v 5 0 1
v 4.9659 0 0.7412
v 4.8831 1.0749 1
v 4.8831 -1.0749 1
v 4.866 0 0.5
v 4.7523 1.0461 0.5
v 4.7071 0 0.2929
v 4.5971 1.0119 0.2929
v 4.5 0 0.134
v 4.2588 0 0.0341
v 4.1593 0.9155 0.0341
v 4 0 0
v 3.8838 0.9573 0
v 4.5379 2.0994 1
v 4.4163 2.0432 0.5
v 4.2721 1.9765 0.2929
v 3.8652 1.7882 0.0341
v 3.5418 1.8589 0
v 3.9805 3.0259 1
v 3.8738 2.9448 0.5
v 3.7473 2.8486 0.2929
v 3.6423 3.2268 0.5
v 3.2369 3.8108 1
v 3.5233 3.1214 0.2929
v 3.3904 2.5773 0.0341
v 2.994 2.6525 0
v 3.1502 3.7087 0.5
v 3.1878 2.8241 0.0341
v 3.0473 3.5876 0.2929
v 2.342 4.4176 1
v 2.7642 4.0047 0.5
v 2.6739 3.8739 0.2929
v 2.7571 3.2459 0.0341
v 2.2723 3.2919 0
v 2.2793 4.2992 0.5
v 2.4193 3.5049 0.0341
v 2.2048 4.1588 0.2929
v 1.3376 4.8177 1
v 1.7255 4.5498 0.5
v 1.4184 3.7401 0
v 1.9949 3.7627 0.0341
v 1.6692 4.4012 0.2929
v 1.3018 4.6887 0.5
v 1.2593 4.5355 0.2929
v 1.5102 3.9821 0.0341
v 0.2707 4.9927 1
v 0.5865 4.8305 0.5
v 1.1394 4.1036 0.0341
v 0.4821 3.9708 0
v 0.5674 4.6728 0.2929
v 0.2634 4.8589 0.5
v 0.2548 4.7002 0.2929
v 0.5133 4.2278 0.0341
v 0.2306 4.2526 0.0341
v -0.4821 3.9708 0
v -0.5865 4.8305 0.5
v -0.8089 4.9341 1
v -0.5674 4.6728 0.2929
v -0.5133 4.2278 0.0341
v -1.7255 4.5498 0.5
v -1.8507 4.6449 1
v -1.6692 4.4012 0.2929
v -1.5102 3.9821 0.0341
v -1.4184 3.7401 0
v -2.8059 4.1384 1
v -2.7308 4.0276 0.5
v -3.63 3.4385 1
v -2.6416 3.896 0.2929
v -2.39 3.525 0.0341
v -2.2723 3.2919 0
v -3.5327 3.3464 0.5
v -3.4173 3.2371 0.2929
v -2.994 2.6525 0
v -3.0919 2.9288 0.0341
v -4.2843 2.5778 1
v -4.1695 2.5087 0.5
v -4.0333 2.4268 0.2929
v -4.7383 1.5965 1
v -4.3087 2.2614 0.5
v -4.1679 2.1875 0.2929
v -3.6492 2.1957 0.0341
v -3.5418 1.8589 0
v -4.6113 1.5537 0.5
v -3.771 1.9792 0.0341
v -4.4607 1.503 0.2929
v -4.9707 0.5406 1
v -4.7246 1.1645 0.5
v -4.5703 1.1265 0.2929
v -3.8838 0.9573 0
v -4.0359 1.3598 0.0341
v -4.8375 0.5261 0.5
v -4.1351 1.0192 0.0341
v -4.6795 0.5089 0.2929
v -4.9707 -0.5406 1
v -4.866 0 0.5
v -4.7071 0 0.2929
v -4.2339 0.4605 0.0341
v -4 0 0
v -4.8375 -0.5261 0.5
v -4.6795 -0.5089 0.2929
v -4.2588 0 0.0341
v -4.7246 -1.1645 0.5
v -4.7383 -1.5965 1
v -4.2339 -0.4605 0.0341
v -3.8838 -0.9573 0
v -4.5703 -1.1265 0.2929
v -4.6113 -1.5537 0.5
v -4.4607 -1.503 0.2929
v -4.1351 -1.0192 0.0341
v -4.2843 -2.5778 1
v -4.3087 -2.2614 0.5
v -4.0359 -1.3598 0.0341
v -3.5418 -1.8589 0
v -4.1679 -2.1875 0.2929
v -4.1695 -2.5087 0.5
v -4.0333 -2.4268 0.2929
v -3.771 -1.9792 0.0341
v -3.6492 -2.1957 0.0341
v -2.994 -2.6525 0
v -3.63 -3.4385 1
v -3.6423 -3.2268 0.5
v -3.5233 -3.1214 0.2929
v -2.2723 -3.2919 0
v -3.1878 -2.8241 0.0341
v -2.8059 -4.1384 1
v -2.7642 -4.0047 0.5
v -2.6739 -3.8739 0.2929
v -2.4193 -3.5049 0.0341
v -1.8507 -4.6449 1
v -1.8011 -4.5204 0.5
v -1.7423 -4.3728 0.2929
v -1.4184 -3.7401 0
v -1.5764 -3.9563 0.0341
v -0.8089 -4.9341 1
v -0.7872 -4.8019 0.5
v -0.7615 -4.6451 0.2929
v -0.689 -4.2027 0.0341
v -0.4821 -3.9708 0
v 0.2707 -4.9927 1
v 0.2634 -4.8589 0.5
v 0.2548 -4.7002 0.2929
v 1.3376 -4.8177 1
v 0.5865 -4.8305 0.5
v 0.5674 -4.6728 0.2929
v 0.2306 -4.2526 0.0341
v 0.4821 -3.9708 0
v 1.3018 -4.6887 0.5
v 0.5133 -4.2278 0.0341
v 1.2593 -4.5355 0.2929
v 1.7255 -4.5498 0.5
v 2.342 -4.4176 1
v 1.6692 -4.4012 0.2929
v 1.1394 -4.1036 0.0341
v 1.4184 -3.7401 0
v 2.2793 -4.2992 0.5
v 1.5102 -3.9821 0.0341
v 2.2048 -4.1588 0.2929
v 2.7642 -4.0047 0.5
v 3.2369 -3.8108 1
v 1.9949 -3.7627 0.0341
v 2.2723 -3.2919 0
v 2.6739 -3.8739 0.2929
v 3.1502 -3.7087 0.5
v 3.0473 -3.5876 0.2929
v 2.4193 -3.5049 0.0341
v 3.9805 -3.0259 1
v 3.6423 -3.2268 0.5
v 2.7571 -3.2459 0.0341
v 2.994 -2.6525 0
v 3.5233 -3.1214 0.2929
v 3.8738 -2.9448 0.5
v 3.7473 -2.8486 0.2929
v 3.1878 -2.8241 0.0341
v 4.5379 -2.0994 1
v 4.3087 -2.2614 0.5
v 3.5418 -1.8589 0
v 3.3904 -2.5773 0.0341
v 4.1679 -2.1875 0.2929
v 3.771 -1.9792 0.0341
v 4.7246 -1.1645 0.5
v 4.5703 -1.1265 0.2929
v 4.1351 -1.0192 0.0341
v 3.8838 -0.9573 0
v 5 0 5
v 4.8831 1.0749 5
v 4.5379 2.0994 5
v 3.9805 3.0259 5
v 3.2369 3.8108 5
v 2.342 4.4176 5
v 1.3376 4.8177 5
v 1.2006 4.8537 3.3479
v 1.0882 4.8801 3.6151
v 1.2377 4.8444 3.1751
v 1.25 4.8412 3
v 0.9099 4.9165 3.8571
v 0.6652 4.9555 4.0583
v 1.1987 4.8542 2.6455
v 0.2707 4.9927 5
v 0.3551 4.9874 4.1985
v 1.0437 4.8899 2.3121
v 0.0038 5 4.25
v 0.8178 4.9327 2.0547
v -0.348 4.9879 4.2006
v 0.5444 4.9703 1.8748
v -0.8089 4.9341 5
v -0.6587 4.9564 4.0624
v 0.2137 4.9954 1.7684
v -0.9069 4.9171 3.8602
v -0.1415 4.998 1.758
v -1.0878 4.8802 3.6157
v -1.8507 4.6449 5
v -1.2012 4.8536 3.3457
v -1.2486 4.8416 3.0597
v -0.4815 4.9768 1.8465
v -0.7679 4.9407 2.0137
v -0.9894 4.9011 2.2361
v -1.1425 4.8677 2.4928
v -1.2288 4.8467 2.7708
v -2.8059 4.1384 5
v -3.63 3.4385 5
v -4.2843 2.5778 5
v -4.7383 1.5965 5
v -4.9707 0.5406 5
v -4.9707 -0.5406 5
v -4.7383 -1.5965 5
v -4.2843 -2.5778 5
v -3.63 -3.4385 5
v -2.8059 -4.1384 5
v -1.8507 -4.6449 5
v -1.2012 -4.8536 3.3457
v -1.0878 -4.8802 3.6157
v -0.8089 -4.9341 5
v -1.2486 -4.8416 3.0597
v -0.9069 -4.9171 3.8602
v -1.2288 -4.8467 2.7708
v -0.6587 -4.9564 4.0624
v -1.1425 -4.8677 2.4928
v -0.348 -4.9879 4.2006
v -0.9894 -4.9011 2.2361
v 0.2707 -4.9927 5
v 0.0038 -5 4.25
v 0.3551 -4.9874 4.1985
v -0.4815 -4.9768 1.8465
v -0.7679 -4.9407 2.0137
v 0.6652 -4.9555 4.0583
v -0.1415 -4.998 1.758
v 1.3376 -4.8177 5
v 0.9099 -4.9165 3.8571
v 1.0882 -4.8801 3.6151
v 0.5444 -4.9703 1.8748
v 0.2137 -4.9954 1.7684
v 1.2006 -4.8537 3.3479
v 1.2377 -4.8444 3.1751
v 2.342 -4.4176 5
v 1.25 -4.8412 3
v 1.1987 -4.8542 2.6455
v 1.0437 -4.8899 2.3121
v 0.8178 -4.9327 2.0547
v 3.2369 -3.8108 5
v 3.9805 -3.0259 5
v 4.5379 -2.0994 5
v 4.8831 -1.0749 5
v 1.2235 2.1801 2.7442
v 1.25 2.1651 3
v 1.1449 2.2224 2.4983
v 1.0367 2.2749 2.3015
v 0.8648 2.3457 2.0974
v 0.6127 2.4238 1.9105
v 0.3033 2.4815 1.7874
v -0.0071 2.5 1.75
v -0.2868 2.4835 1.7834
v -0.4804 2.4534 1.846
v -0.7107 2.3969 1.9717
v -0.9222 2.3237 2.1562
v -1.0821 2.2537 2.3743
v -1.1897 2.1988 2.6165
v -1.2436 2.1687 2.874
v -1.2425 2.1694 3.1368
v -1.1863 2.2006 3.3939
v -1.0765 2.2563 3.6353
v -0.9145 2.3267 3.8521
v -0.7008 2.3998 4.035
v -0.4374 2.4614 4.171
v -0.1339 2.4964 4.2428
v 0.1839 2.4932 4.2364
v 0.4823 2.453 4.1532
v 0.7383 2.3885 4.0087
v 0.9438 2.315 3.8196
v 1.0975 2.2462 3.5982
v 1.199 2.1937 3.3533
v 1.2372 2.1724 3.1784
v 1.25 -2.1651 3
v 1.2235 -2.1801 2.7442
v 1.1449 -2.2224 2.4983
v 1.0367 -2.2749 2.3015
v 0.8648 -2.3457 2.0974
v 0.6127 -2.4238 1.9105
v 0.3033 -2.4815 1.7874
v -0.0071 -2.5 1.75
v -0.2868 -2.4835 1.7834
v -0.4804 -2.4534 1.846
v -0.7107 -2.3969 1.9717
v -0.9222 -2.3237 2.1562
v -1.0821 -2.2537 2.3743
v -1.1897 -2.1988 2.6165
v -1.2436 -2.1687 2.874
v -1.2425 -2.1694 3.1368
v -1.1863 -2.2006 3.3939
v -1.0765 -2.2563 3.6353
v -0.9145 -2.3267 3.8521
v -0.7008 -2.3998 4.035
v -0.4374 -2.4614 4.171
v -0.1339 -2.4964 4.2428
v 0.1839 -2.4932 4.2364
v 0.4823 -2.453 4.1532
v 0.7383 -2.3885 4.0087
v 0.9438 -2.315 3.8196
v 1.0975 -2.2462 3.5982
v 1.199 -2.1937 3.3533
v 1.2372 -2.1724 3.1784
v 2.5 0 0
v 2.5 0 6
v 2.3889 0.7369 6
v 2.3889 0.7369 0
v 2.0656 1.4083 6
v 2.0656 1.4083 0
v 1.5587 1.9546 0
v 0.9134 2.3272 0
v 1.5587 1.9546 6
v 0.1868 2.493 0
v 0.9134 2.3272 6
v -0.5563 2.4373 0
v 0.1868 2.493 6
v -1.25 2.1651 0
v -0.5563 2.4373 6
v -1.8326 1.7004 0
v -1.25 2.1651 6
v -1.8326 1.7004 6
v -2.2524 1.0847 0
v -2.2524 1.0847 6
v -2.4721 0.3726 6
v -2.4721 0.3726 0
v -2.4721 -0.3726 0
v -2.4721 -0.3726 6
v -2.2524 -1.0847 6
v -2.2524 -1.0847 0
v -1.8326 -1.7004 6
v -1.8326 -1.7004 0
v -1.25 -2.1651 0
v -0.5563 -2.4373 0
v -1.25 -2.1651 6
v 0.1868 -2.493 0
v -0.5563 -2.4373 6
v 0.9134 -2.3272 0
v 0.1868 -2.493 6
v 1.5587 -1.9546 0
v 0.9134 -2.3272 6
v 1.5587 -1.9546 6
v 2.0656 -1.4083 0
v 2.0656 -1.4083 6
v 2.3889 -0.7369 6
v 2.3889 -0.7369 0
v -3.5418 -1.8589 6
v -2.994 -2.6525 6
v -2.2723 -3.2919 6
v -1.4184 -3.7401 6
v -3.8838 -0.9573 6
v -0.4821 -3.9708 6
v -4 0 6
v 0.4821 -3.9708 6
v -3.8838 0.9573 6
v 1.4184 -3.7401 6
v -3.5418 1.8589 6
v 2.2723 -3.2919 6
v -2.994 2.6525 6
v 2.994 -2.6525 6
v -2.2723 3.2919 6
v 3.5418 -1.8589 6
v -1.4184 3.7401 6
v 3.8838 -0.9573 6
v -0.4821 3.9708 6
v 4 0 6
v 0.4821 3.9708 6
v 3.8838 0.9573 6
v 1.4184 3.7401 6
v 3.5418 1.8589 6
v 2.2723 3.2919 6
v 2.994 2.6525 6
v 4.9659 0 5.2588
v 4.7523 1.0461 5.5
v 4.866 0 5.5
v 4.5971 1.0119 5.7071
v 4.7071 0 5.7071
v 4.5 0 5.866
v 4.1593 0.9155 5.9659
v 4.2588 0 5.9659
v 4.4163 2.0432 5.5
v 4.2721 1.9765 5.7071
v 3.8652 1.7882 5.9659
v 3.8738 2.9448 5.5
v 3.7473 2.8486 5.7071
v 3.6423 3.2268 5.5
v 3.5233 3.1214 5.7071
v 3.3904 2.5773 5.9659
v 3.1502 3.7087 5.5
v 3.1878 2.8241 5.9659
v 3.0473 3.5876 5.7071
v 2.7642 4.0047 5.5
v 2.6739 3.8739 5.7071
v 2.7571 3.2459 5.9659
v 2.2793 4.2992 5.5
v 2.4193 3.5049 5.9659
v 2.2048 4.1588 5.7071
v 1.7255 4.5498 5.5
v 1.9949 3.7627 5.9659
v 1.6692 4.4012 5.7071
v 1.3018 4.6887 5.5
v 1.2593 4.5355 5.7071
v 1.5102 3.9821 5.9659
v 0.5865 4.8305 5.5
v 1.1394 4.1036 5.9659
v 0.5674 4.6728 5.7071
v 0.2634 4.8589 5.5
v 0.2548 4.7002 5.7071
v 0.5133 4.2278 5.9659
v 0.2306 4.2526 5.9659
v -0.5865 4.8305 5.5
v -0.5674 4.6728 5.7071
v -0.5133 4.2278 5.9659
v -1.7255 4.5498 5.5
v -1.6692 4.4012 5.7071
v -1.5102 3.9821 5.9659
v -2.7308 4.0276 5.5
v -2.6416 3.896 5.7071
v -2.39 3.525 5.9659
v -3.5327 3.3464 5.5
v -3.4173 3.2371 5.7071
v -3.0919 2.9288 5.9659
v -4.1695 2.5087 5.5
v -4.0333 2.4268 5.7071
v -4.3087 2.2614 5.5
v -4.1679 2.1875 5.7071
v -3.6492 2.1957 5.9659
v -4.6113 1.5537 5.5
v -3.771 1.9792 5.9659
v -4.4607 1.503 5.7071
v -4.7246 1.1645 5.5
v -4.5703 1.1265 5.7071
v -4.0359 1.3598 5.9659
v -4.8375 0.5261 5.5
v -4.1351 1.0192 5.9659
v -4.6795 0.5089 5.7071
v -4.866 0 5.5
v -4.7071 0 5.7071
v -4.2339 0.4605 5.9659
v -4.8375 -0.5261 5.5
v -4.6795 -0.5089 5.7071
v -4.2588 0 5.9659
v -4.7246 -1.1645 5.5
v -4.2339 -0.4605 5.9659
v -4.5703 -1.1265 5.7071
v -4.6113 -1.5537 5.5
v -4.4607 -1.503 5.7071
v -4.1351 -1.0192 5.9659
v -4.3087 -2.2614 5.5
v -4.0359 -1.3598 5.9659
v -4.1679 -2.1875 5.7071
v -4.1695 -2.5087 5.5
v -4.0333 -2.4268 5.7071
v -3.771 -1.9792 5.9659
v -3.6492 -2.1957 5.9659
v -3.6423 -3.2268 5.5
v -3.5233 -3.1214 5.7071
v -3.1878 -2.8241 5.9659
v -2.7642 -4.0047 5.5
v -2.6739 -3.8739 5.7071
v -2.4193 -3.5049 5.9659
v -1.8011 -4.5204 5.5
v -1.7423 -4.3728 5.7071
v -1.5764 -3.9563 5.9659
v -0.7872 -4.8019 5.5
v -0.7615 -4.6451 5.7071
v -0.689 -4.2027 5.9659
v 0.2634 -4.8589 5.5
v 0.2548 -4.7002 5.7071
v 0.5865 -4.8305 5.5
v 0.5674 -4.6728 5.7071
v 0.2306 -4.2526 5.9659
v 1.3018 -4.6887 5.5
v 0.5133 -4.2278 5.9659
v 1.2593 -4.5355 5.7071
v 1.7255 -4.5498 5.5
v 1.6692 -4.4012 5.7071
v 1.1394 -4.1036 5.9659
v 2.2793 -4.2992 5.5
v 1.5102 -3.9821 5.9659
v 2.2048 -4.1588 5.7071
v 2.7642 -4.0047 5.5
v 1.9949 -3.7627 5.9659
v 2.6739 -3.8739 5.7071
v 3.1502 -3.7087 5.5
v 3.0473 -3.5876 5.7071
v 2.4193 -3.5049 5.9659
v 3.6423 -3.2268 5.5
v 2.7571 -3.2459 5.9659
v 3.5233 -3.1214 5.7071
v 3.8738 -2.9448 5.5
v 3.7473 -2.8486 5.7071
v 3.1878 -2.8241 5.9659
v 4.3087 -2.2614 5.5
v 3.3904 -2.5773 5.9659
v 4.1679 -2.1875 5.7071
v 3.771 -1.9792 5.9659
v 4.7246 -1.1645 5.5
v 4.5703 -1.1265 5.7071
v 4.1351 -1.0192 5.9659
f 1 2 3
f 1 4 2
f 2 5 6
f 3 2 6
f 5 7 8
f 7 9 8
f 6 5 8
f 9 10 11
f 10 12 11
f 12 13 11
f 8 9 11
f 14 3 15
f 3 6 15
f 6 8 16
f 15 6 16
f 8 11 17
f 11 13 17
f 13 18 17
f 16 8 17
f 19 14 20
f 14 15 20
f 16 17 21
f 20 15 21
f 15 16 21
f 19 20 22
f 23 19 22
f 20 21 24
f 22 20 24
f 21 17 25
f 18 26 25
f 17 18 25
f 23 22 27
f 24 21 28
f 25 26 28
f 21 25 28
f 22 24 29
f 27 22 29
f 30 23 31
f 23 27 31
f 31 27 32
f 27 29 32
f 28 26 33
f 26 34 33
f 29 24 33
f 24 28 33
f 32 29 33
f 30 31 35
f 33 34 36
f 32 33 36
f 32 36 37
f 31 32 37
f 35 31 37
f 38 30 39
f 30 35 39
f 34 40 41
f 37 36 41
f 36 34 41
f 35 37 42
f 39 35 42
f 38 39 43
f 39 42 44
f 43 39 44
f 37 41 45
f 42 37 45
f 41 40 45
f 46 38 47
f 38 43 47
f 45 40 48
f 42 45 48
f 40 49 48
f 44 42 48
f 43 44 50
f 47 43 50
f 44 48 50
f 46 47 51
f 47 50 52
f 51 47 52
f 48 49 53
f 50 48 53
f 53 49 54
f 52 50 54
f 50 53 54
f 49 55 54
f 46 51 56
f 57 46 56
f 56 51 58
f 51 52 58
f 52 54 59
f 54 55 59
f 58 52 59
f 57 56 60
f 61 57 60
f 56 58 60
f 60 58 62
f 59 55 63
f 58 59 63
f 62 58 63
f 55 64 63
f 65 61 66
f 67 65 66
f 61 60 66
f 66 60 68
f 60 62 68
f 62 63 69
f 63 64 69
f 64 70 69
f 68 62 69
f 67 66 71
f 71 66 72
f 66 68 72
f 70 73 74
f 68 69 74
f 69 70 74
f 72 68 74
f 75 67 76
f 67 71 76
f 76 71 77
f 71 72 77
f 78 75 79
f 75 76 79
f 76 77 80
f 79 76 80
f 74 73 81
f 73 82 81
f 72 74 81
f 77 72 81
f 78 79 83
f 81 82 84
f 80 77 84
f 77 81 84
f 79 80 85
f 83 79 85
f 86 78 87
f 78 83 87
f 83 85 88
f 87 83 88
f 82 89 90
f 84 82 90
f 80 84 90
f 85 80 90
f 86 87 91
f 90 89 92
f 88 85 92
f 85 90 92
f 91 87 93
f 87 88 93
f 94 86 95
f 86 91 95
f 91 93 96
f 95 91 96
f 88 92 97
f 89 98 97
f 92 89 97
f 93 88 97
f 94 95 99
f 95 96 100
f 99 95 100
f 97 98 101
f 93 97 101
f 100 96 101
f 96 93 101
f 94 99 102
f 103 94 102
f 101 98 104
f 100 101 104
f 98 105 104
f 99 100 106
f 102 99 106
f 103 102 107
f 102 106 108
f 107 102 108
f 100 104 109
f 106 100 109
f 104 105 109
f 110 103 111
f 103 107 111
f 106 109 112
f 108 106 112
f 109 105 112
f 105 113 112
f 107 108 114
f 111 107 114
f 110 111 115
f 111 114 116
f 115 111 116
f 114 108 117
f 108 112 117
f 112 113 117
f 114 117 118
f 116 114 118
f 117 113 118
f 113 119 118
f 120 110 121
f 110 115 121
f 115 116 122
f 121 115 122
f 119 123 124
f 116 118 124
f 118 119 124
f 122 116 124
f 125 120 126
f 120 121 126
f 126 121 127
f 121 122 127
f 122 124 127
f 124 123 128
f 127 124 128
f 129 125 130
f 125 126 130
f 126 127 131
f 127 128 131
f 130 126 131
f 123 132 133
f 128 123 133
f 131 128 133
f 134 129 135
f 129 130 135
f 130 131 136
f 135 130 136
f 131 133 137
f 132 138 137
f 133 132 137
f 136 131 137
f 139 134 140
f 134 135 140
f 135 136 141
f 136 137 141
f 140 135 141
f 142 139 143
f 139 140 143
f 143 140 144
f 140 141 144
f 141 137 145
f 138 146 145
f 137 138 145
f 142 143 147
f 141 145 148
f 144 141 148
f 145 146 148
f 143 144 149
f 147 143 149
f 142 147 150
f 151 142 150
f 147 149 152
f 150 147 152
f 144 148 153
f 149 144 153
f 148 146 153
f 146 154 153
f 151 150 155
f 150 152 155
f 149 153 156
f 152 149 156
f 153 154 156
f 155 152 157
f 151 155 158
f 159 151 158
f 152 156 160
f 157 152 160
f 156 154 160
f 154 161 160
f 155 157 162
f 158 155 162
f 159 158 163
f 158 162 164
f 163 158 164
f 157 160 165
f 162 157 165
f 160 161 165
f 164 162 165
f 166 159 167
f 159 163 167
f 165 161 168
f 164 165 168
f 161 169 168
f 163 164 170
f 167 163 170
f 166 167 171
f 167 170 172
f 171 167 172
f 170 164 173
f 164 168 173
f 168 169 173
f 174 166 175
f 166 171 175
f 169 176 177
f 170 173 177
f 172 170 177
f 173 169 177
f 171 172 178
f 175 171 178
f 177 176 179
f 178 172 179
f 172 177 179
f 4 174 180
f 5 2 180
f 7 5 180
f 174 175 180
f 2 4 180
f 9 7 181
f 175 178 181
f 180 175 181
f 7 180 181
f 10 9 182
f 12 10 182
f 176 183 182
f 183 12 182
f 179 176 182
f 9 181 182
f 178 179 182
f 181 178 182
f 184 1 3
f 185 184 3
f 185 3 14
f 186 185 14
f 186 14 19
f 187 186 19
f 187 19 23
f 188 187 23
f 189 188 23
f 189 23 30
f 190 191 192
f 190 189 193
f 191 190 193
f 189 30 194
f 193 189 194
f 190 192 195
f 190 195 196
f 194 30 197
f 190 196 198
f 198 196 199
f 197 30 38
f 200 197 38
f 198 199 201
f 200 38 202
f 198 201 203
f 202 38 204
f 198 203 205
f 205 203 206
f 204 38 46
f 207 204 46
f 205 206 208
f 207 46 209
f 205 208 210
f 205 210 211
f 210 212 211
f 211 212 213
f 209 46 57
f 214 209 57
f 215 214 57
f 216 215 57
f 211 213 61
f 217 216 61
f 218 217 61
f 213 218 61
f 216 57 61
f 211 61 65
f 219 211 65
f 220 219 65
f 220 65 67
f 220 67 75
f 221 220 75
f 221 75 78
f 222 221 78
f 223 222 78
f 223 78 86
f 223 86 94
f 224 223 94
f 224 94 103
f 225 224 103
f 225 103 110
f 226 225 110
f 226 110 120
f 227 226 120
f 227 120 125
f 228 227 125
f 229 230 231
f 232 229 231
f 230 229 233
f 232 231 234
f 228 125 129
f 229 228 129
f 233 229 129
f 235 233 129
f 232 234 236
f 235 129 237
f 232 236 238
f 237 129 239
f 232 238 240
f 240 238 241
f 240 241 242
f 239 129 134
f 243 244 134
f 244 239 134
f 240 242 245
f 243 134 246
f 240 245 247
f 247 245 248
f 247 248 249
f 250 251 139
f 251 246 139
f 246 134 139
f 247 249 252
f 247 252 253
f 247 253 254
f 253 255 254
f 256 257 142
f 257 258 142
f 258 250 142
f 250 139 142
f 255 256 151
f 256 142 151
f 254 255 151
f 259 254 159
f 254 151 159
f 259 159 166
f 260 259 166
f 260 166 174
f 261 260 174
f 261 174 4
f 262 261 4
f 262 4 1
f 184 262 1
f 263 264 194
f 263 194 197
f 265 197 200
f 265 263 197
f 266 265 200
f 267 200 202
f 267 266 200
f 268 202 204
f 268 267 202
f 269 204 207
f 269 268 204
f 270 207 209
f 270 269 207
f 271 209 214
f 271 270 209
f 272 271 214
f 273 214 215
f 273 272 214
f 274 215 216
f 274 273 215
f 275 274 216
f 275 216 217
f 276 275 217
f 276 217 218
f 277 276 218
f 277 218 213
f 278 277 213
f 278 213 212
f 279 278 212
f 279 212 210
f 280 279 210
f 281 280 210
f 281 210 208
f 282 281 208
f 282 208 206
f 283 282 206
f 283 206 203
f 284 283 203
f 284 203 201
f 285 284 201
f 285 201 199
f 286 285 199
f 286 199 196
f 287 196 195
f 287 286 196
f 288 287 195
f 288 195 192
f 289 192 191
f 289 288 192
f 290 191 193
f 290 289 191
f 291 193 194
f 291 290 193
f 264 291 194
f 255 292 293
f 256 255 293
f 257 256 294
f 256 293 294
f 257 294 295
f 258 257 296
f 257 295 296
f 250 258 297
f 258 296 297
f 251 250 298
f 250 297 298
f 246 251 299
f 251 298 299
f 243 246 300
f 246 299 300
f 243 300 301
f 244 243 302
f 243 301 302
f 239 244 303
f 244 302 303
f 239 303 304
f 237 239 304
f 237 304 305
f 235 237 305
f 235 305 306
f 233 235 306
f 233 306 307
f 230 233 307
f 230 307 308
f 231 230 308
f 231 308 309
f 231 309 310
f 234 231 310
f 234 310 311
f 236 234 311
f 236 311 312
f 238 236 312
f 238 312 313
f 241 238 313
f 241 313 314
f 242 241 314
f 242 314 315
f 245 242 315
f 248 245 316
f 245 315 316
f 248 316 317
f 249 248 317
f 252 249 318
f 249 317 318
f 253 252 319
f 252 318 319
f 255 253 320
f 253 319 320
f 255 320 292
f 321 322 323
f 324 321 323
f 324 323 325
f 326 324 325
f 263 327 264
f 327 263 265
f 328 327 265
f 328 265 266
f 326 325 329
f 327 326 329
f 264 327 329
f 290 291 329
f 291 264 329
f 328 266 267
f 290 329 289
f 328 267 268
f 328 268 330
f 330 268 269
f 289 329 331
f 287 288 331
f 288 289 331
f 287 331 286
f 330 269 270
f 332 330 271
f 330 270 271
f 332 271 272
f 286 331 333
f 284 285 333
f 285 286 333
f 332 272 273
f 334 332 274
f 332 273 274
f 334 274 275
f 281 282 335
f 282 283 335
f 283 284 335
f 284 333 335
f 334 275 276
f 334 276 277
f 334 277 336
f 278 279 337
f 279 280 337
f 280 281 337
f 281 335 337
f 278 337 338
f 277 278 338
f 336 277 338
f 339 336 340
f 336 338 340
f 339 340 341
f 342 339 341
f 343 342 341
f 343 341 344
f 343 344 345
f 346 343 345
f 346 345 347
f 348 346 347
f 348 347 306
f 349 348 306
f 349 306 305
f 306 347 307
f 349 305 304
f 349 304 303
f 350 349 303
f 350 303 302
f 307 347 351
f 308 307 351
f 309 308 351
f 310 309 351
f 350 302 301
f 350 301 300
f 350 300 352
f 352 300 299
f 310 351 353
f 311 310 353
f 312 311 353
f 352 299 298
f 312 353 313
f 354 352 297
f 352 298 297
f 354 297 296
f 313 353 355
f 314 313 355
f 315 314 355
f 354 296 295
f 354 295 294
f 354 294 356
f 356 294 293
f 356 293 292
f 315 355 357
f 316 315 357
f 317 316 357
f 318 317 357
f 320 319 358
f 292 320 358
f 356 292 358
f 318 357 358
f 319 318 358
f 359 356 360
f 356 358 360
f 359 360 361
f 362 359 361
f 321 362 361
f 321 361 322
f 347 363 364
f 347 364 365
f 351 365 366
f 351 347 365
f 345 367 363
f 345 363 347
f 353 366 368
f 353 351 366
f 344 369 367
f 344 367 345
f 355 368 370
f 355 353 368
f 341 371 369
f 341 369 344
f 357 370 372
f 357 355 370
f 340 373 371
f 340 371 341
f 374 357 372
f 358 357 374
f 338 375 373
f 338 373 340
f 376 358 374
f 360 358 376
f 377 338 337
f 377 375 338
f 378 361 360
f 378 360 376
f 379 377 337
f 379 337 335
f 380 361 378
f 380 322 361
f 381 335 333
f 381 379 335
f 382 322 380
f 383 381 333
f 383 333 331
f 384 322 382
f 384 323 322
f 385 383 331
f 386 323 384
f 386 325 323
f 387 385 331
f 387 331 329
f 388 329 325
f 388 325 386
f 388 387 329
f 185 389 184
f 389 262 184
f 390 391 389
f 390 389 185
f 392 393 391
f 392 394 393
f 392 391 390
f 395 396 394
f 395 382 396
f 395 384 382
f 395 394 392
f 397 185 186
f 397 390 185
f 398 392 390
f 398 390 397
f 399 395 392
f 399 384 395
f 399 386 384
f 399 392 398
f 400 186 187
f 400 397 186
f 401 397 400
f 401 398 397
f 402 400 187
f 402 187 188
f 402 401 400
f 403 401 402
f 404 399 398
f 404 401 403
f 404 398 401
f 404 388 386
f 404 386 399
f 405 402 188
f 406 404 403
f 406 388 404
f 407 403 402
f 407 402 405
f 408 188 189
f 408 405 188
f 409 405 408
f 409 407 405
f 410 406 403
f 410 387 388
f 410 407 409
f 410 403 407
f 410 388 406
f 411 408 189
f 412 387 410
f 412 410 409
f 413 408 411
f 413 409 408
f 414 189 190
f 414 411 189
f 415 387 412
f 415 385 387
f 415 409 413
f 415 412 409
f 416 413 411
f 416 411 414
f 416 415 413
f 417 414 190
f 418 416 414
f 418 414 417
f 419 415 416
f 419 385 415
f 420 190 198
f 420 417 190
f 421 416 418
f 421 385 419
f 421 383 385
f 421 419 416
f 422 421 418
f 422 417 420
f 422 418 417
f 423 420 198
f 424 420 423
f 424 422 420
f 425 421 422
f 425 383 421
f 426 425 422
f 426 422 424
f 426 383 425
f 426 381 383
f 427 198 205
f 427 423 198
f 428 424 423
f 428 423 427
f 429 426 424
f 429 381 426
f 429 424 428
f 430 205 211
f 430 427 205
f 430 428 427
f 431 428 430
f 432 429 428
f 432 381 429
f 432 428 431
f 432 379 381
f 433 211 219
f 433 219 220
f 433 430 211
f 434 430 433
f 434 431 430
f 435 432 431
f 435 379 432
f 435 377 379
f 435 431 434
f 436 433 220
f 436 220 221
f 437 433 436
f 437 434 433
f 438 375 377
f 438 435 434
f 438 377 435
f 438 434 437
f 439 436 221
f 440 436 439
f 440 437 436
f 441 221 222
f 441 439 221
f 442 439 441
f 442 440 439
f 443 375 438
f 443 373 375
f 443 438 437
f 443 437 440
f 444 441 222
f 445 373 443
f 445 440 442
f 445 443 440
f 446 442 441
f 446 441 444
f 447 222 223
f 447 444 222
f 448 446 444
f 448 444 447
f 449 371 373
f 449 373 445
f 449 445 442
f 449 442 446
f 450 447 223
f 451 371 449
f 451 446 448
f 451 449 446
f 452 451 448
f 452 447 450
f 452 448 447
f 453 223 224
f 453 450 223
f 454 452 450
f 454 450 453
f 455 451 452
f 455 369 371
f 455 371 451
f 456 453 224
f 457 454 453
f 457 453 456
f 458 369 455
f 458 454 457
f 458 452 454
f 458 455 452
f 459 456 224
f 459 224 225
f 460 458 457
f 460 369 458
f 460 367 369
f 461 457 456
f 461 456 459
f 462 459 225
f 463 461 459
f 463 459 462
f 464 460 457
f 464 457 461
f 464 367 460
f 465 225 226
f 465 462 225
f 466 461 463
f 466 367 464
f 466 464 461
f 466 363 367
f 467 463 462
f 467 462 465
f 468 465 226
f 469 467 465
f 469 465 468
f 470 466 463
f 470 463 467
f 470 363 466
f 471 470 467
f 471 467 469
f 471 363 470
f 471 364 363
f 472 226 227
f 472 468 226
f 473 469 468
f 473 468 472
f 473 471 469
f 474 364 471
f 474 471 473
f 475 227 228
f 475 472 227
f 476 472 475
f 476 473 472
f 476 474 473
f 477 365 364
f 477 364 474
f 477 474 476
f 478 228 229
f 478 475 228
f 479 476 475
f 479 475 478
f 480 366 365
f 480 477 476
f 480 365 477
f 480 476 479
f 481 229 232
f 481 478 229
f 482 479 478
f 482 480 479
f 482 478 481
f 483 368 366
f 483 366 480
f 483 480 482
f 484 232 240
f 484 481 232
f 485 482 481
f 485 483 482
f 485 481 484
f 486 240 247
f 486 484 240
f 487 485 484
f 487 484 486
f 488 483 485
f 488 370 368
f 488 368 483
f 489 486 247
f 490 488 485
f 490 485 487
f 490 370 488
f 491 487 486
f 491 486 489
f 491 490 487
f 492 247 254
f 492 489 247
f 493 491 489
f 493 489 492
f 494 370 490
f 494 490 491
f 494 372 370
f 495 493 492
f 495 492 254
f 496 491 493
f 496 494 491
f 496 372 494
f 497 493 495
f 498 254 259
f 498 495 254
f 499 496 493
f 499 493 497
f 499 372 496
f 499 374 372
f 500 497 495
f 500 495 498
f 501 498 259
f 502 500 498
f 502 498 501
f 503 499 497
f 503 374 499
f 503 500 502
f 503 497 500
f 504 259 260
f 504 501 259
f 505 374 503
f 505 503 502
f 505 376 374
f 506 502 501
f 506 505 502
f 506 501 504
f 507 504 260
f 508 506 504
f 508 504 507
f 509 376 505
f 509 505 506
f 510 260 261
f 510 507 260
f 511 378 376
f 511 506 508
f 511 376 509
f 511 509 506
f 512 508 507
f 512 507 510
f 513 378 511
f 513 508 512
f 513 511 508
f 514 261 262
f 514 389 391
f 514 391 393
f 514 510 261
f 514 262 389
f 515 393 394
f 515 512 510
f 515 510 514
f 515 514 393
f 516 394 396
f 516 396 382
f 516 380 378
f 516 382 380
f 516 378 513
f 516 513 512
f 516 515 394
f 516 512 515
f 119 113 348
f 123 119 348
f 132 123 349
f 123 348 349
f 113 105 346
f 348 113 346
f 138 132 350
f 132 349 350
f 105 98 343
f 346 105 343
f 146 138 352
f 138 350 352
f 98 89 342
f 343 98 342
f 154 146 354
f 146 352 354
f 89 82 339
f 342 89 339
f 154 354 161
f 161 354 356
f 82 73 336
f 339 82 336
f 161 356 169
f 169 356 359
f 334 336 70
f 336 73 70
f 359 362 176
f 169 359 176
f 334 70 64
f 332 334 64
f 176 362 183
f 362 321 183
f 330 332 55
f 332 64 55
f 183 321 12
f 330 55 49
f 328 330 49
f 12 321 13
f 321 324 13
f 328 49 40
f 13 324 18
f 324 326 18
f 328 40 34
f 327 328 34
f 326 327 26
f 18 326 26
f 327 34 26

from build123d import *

# Parameters (mm, degrees)
SKETCH1_R               = 5
BOSS_EXTRUDE1_DEPTH     = 6
FILLET3_R               = 1
SKETCH2_R               = 2.5
CUT_EXTRUDE1_DEPTH      = 1
CUT_EXTRUDE1_DEPTH_BACK = 7
SKETCH3_R               = 1.25
CUT_EXTRUDE2_DEPTH      = 6.0000001
CUT_EXTRUDE2_DEPTH_BACK = 6


with BuildPart() as part:
    # Sketch1 → Boss-Extrude1 (new body)
    with BuildSketch(Plane.XY):
        Circle(SKETCH1_R)
    extrude(amount=BOSS_EXTRUDE1_DEPTH)

    # Fillet3
    fillet3_edges = [part.edges().sort_by_distance(p)[0] for p in [
        (-5, 0, 0),
        (-5, 0, 6),
    ]]
    fillet(fillet3_edges, radius=FILLET3_R)

    # Sketch2 → Cut-Extrude1 (cut, two sides)
    with BuildSketch(Plane.XY.offset(6)) as cut_extrude1_sk:
        Circle(SKETCH2_R)
    extrude(amount=CUT_EXTRUDE1_DEPTH, mode=Mode.SUBTRACT)
    extrude(cut_extrude1_sk.sketch, amount=-CUT_EXTRUDE1_DEPTH_BACK, mode=Mode.SUBTRACT)

    # Sketch3 → Cut-Extrude2 (cut, two sides)
    with BuildSketch(Plane(origin=(0, 0, 0), x_dir=(1, 0, 0), z_dir=(0, 1, 0))) as cut_extrude2_sk:
        with Locations((0, -3)):
            Circle(SKETCH3_R)
    extrude(amount=CUT_EXTRUDE2_DEPTH, mode=Mode.SUBTRACT)
    extrude(cut_extrude2_sk.sketch, amount=-CUT_EXTRUDE2_DEPTH_BACK, mode=Mode.SUBTRACT)


solid = part.part
